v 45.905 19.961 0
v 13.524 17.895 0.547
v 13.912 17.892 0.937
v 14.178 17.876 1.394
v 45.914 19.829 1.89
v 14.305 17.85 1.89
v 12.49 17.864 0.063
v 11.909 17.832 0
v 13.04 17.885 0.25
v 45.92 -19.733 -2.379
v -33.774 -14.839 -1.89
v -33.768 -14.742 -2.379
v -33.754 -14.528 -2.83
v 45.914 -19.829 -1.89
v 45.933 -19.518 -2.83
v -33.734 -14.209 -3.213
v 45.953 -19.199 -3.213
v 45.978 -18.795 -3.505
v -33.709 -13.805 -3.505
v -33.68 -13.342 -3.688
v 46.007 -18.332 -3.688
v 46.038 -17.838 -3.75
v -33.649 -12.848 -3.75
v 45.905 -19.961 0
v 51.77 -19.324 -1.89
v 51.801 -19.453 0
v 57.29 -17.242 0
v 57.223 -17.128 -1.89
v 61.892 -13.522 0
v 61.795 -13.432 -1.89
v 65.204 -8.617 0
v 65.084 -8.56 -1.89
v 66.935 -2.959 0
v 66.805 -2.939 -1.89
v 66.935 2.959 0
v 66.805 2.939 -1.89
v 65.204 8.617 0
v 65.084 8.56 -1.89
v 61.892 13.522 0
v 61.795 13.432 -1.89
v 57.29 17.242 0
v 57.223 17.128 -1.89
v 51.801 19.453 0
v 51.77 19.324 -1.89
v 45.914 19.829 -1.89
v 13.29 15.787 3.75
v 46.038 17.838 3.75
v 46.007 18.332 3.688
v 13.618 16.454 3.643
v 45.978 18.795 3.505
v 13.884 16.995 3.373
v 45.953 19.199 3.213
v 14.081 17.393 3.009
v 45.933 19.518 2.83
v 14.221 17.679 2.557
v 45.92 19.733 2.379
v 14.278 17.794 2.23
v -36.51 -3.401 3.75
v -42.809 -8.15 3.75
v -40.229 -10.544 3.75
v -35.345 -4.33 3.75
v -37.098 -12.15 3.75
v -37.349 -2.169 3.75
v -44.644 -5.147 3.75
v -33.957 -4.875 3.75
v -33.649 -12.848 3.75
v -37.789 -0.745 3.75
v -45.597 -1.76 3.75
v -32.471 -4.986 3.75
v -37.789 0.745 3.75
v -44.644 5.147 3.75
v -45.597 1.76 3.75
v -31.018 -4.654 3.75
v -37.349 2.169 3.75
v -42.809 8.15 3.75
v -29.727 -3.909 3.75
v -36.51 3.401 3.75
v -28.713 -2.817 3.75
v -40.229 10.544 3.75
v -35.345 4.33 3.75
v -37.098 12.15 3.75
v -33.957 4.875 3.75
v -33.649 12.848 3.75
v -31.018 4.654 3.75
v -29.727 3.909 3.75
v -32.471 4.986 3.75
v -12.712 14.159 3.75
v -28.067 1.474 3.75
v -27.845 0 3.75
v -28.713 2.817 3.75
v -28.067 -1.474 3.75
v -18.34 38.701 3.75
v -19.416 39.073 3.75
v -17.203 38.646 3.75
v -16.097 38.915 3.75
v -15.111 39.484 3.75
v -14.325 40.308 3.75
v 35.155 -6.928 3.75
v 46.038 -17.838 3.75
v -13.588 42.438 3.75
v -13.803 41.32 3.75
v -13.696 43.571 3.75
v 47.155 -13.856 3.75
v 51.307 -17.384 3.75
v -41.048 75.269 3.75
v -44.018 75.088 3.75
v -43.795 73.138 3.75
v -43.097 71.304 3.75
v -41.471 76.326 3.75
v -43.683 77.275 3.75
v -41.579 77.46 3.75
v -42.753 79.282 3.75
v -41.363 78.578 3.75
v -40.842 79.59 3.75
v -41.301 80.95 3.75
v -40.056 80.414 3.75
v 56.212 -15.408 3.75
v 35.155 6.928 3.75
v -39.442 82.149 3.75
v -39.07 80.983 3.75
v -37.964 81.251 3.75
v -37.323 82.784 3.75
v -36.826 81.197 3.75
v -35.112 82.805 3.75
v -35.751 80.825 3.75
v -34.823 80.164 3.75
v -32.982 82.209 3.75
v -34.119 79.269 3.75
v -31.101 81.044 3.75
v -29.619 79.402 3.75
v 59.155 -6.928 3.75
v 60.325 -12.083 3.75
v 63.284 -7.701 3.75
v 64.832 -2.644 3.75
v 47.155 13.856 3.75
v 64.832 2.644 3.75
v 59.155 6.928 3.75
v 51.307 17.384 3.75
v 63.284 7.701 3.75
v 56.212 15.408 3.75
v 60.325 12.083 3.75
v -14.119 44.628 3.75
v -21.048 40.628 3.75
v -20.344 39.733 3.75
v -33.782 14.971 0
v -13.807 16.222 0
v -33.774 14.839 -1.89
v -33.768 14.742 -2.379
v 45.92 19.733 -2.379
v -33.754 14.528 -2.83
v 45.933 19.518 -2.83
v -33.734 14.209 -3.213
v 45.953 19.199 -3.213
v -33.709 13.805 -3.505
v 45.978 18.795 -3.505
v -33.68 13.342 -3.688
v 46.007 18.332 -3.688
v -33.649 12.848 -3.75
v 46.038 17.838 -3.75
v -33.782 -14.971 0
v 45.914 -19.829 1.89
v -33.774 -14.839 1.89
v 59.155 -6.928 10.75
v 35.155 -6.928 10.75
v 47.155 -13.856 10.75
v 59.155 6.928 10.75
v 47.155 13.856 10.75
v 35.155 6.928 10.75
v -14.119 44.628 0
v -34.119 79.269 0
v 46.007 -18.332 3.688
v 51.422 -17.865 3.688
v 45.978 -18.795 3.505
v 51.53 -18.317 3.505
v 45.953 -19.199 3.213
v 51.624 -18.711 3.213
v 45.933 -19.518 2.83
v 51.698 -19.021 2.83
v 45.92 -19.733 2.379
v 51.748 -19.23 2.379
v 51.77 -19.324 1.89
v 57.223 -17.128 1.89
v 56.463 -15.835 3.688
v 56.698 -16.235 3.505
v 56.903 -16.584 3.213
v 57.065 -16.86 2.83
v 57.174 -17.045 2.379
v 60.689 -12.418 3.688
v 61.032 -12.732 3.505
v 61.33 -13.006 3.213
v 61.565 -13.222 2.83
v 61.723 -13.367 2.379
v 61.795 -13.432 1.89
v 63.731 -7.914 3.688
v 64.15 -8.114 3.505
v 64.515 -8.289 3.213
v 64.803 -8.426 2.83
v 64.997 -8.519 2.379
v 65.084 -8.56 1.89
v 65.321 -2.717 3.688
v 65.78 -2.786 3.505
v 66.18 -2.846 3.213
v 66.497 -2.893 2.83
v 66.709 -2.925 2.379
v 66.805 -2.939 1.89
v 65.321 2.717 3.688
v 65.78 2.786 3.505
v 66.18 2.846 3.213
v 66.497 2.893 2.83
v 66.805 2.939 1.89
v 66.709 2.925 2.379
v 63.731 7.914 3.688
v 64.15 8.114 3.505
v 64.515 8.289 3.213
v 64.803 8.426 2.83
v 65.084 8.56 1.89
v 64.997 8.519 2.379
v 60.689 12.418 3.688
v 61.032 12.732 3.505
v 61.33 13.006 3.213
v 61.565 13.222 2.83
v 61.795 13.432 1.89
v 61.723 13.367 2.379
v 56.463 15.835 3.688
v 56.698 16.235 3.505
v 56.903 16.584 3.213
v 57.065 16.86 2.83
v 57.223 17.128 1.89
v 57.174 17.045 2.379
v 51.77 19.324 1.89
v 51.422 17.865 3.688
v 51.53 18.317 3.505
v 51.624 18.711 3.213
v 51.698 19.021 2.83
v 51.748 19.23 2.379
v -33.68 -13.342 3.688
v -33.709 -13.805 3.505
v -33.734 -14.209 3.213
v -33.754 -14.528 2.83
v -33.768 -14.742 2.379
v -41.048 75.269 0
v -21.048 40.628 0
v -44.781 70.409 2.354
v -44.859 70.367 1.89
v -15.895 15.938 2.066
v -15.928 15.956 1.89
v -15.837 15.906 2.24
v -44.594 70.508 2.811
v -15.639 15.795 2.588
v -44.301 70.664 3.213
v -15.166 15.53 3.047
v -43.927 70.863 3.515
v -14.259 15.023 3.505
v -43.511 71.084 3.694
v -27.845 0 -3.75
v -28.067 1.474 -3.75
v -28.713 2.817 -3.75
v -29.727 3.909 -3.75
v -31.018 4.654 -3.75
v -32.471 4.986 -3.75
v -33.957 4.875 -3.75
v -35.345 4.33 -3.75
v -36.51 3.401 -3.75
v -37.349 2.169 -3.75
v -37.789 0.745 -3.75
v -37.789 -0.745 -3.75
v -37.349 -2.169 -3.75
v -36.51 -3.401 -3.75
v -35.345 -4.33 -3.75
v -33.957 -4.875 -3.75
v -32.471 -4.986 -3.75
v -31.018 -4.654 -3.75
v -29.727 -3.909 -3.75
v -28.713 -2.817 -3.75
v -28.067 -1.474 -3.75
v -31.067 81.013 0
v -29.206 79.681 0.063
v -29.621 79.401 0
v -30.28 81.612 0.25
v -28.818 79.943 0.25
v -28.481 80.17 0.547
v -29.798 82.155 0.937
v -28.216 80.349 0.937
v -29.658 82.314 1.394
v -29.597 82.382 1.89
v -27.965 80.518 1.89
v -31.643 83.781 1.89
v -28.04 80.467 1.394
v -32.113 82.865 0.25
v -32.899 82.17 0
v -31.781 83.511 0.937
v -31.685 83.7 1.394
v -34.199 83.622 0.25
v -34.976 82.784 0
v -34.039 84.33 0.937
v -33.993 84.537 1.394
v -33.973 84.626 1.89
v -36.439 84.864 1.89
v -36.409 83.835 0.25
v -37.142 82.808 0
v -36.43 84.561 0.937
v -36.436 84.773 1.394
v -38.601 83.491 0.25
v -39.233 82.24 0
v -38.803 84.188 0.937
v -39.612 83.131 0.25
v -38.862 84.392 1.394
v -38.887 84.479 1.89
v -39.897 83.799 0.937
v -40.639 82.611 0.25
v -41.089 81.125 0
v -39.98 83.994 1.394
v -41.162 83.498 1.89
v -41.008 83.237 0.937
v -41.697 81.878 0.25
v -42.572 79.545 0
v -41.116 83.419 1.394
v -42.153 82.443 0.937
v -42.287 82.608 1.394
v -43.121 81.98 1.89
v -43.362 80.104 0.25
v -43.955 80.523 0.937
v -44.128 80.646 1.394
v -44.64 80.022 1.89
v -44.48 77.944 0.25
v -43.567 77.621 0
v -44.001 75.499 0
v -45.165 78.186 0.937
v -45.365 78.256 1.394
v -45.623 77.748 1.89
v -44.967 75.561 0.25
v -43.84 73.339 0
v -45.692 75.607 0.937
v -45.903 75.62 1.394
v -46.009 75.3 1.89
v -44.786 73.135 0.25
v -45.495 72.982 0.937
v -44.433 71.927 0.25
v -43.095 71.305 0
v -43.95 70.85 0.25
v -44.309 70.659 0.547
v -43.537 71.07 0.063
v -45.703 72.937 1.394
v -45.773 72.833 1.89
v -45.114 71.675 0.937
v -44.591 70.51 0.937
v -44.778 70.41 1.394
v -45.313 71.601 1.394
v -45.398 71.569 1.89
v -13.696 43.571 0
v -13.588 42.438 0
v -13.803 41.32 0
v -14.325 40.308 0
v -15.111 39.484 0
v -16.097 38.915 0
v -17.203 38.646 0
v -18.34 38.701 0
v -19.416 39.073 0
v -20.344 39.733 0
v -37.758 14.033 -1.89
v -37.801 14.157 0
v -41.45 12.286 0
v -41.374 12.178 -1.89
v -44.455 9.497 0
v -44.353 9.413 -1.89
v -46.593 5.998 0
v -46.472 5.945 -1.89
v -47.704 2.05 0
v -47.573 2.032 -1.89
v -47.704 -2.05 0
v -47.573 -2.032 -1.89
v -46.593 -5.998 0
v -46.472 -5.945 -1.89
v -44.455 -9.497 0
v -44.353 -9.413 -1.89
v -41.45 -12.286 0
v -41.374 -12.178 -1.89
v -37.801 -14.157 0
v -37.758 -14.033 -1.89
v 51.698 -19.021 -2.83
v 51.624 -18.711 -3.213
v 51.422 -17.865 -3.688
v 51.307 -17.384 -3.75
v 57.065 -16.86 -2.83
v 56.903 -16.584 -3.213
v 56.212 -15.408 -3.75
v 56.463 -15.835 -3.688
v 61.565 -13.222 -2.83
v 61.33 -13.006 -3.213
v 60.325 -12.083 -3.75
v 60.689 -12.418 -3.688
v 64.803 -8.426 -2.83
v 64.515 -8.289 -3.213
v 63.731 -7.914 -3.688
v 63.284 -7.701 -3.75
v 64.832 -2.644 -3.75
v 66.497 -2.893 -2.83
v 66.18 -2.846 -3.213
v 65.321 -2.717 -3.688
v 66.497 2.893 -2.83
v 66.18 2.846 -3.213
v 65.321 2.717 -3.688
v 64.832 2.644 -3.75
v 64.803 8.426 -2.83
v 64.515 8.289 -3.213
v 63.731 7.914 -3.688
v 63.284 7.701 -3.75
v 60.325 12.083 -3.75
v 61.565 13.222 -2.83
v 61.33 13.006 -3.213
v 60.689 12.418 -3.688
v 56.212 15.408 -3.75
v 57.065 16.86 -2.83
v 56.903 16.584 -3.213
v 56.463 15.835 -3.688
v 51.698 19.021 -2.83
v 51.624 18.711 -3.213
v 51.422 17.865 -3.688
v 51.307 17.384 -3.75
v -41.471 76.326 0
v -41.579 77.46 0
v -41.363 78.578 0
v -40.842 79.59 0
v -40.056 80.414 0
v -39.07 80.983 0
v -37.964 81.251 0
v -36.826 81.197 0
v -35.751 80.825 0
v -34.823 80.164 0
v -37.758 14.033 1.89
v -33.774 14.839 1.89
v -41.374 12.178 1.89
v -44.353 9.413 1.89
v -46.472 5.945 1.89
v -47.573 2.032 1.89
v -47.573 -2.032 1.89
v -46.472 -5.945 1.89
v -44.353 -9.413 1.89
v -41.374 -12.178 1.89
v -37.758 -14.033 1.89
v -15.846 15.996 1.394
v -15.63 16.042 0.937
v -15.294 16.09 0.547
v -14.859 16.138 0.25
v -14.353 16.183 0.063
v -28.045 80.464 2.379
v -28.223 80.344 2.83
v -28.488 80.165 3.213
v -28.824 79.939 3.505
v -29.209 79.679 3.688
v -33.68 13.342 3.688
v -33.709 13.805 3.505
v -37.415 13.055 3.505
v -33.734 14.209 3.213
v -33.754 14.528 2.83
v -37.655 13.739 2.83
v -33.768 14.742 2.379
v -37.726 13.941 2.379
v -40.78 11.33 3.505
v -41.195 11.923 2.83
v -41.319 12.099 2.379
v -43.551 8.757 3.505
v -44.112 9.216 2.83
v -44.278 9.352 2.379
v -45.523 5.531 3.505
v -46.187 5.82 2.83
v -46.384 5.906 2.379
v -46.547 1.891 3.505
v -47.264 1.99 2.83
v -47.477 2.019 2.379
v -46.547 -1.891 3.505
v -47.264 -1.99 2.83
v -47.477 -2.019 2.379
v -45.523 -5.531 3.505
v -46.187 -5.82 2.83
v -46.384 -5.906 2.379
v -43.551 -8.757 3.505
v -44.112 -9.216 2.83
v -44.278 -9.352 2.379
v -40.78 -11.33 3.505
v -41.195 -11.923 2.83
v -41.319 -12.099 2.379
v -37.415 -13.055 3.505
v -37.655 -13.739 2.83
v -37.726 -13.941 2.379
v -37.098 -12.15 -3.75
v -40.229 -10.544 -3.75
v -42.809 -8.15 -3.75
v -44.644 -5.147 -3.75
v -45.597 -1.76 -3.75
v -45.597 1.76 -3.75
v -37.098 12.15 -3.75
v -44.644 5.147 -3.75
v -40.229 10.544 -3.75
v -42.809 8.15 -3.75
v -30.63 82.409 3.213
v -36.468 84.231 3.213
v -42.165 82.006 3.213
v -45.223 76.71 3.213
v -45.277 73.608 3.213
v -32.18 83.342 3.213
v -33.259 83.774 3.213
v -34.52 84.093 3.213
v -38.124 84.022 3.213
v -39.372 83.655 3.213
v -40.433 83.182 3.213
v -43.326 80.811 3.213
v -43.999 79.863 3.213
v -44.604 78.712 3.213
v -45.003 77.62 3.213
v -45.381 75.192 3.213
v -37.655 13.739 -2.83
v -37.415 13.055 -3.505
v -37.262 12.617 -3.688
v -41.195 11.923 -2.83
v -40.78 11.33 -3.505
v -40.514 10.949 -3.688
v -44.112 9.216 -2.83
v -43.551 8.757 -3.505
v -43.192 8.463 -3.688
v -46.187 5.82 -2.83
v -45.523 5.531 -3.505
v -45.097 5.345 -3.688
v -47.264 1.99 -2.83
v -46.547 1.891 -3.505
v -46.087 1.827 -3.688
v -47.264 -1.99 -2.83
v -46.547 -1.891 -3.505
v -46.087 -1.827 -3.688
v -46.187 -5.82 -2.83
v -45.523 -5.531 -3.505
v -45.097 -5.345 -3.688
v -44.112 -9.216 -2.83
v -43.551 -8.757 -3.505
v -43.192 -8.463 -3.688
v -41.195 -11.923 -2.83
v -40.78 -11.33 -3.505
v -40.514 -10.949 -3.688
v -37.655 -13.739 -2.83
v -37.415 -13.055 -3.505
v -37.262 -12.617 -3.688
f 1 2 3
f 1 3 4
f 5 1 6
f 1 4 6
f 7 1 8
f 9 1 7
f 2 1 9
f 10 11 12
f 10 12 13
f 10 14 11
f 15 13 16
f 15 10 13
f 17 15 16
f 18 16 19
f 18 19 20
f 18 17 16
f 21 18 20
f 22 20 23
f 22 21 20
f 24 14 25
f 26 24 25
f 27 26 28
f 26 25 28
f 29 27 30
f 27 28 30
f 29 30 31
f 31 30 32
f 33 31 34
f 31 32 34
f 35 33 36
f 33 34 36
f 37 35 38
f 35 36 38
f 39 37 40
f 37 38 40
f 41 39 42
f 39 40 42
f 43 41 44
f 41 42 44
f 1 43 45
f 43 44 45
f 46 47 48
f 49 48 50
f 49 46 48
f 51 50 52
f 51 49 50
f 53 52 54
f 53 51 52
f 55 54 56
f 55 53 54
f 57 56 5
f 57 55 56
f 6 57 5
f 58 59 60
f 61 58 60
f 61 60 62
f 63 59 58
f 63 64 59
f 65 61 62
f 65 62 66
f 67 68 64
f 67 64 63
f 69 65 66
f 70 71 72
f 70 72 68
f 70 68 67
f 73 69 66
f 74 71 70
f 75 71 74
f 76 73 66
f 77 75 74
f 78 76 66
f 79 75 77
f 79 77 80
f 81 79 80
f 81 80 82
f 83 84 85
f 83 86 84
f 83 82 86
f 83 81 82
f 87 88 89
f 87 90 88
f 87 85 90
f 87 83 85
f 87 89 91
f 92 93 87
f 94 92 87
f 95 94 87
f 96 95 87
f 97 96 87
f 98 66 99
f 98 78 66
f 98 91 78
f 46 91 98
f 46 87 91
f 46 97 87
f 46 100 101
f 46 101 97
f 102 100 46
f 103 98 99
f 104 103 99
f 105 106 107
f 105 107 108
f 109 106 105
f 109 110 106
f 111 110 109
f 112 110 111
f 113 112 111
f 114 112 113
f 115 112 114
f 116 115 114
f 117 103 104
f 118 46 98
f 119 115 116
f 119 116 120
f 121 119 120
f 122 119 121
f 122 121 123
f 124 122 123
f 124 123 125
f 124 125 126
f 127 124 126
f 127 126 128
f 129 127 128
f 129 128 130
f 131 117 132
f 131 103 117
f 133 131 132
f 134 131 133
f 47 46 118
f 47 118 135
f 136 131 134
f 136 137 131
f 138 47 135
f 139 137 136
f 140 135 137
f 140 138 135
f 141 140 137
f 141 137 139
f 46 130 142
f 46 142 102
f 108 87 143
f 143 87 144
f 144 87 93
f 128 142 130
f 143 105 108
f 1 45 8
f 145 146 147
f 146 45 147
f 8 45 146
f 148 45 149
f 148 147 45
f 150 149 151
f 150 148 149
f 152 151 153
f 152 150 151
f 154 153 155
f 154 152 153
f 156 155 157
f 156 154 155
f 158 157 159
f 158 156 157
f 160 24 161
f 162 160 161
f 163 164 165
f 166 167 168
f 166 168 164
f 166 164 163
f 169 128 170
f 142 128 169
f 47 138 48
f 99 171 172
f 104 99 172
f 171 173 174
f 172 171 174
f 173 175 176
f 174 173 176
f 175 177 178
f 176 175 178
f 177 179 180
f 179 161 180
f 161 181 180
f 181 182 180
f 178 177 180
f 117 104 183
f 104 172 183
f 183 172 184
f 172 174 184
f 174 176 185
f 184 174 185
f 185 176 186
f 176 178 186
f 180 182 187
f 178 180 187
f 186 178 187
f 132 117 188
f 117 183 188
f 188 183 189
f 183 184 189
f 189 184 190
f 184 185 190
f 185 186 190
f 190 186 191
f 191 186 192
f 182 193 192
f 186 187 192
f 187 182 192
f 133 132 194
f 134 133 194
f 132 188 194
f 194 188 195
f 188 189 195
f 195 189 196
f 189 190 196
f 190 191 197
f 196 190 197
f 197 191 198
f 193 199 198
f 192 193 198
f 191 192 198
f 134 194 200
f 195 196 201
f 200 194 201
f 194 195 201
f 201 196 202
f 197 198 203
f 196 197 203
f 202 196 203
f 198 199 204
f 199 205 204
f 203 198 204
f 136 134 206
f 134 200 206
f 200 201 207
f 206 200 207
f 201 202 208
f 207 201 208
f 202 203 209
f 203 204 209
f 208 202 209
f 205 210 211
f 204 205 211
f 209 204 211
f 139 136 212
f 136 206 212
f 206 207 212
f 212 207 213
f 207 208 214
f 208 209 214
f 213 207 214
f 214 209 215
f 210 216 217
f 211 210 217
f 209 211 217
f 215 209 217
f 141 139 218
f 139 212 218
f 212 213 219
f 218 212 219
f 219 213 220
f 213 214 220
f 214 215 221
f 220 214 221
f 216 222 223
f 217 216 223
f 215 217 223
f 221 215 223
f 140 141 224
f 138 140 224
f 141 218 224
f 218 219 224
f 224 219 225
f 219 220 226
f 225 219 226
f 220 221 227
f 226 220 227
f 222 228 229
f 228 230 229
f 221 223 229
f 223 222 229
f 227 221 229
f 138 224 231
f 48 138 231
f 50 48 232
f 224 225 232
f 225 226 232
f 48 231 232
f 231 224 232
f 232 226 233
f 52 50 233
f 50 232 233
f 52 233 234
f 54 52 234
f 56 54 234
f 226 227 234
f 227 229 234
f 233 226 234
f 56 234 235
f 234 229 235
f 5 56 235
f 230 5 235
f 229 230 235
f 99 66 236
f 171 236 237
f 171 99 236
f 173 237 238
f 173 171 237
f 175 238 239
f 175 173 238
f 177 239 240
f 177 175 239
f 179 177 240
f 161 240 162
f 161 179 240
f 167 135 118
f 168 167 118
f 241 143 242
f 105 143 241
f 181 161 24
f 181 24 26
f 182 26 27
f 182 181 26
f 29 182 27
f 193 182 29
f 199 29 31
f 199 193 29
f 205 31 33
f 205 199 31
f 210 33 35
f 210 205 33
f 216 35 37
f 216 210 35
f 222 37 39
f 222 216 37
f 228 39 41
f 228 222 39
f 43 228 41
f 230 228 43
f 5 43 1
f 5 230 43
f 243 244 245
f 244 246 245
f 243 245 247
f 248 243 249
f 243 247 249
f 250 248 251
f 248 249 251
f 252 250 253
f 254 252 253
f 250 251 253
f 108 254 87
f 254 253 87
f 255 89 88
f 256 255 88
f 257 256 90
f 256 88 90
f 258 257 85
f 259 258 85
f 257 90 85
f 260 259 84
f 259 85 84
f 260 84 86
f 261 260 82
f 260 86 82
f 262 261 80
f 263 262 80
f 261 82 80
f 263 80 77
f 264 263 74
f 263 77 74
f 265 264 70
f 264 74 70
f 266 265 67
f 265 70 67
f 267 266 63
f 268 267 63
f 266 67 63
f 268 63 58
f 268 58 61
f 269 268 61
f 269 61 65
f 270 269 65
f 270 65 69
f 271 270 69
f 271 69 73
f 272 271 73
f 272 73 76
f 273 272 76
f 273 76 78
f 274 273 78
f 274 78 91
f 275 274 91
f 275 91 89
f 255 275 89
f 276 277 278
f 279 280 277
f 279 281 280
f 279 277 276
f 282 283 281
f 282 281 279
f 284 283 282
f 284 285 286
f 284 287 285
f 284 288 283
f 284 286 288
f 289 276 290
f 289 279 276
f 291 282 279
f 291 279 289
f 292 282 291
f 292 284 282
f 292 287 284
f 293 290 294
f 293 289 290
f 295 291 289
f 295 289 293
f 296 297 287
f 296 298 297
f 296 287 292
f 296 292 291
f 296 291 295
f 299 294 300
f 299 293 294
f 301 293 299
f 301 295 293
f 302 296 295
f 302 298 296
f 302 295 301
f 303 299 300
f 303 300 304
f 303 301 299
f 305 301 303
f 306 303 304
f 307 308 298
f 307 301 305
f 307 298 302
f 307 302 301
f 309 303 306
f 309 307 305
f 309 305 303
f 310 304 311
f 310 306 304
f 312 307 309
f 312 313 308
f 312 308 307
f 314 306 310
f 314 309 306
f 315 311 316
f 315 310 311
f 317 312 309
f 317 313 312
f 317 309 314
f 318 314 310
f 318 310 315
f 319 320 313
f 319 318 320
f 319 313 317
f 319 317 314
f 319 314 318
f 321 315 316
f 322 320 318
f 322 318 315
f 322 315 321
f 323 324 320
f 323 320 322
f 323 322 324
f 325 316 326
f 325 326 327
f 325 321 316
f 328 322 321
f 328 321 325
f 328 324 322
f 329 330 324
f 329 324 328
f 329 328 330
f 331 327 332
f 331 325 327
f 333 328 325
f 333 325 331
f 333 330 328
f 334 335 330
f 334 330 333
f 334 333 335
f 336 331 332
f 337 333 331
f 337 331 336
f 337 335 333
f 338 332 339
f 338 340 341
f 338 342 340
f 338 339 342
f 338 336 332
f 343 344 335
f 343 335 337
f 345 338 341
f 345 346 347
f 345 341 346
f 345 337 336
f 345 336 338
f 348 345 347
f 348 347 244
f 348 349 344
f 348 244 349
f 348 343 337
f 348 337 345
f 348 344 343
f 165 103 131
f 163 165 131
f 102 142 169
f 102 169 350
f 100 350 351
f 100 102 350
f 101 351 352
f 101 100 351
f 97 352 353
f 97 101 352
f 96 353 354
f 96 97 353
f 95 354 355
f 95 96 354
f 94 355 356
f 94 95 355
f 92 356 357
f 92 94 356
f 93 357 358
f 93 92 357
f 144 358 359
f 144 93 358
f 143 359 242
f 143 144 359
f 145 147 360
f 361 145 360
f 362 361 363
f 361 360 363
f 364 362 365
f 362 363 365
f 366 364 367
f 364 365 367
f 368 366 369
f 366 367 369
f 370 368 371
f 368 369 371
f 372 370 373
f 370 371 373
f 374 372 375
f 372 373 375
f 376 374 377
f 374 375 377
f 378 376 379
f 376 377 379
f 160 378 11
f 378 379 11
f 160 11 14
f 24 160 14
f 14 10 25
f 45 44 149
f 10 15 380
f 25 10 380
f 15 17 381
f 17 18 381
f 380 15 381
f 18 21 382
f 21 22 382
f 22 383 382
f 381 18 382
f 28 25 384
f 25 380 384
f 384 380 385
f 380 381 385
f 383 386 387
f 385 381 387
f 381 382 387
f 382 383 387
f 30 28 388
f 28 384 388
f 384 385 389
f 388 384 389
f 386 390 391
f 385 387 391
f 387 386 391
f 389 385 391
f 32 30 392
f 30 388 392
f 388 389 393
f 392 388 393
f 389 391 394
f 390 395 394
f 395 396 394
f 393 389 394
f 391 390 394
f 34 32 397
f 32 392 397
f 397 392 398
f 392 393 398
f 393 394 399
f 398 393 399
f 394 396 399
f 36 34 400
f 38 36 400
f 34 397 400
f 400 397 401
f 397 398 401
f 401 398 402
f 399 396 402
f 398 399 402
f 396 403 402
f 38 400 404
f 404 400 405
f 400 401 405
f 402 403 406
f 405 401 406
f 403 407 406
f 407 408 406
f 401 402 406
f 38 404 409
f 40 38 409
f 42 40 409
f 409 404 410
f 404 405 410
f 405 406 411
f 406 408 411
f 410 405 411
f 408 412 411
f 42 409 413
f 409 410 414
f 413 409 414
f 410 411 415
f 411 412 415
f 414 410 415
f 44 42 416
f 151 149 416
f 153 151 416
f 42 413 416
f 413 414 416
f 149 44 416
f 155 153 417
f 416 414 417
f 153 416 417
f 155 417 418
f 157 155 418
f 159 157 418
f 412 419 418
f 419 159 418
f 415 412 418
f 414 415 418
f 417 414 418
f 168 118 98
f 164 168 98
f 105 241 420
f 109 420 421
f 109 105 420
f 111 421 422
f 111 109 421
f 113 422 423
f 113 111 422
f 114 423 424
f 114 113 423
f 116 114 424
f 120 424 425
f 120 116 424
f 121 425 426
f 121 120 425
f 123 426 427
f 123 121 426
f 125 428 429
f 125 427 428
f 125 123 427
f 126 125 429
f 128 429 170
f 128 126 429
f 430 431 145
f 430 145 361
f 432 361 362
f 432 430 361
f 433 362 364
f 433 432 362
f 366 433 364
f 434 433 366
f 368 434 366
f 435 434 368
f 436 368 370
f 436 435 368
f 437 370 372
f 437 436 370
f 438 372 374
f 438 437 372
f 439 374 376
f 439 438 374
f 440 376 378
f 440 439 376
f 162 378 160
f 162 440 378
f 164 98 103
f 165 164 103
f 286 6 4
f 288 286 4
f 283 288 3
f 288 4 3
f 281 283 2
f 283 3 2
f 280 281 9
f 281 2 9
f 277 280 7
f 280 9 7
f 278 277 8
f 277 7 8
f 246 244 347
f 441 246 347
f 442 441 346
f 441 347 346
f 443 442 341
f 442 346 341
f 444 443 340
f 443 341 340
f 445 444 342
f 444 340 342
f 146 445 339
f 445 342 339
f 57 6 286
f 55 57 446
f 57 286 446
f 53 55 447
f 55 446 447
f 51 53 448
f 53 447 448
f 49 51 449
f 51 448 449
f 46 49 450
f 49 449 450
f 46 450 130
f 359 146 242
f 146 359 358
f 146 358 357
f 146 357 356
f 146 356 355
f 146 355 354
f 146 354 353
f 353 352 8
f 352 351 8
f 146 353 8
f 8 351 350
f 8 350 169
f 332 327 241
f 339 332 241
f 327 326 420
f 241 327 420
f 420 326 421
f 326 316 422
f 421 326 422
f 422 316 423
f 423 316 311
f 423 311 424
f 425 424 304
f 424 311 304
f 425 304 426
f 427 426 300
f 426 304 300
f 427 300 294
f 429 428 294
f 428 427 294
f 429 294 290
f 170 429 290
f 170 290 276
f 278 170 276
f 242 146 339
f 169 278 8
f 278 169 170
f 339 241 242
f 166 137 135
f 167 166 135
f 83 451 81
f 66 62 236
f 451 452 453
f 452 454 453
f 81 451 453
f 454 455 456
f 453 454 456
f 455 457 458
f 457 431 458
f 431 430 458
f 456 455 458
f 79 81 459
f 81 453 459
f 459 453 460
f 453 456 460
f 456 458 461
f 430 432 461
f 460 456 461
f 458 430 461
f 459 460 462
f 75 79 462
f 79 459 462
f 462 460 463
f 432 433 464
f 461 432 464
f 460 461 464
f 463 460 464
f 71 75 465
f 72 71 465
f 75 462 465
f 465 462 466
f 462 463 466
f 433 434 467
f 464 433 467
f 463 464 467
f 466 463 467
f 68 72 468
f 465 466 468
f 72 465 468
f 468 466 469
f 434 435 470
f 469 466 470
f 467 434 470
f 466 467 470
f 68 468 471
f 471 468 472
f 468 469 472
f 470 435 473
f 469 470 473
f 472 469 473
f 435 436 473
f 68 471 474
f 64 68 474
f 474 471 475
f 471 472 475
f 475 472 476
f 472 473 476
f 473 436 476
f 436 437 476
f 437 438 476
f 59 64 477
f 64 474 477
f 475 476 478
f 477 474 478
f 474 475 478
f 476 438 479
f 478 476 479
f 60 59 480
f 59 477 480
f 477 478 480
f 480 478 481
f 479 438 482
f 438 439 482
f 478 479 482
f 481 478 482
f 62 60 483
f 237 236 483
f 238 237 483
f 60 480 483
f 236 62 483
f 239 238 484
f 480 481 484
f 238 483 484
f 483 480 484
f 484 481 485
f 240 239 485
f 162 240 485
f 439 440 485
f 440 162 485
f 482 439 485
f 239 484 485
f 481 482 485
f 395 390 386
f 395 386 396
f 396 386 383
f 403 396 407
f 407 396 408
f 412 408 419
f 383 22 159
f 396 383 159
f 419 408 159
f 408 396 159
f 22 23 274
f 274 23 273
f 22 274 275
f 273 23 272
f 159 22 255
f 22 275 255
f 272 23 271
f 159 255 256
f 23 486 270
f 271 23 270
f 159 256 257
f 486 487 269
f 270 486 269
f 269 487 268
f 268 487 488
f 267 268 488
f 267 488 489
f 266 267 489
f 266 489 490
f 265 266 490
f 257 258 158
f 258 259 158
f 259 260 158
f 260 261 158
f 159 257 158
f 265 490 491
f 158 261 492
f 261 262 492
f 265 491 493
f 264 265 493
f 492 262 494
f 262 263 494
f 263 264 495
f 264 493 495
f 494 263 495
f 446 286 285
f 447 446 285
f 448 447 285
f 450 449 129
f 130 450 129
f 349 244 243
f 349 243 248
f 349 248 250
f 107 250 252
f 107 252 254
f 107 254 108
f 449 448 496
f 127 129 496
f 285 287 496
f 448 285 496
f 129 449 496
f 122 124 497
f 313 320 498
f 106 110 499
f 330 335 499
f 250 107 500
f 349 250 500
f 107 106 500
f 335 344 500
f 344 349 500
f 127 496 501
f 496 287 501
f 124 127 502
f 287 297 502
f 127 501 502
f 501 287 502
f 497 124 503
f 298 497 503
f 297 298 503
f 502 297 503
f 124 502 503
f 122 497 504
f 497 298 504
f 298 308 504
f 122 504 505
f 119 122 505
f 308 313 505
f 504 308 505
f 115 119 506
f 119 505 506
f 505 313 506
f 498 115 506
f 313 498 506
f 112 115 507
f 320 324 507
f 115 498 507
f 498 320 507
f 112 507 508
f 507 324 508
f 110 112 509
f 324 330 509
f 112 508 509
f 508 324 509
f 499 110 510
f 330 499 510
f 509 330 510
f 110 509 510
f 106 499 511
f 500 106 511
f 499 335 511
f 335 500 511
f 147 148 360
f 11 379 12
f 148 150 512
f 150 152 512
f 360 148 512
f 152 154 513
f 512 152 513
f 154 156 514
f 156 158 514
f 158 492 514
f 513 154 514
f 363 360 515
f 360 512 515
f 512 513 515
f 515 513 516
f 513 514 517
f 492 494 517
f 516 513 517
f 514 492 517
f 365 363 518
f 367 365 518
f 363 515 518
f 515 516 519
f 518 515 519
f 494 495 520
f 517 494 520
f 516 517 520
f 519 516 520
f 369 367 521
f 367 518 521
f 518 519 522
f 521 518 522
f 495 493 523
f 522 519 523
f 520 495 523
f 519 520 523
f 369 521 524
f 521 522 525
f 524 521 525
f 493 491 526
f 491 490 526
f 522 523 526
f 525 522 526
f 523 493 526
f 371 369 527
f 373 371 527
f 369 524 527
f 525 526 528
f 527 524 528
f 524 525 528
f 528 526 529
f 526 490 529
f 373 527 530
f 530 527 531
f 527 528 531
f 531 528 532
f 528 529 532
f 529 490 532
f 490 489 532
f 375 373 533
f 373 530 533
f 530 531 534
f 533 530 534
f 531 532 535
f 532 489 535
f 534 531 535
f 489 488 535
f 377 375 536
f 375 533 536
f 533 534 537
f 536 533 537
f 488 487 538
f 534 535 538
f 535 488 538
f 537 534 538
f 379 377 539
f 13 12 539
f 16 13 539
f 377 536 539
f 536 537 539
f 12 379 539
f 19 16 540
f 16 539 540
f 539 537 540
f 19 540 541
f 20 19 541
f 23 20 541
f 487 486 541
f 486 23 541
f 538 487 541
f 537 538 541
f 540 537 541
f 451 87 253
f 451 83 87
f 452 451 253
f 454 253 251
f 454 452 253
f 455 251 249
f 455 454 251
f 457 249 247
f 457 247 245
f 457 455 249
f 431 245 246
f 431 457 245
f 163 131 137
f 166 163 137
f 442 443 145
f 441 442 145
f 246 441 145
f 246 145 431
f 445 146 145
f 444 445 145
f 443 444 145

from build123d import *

# Parameters (mm, degrees)
EXTRUDE_313_DEPTH           = 3.75
EXTRUDE_313_TAPER           = 4.000000000000009
EXTRUDE_313_OTHER_WAY_DEPTH = 3.75
EXTRUDE_313_OTHER_WAY_TAPER = 4.000000000000009
EXTRUDE_604_DEPTH           = 3.75
EXTRUDE_604_TAPER           = 4.000000000000009
CUT_EXTRUDE_1_DEPTH         = 109.586836915909
SKETCH_4_R                  = 5.000000000000001
CUT_EXTRUDE_2_DEPTH         = 109.586836915909
EXTRUDE_4_DEPTH             = 7
FILLET_1_R                  = 2
FILLET_2_R                  = 2


with BuildPart() as part:
    # Эскиз1 → Extrude 313 (new body)
    with BuildSketch(Plane.XY):
        with BuildLine():
            ThreePointArc((-33.78207478005865, 14.970674458754354), (-47.84457478005865, 1.84e-15), (-33.78207478005865, -14.970674458754353))
            Line((-33.78207478005865, -14.970674458754353), (45.90542521994135, -19.960899278339138))
            ThreePointArc((45.90542521994135, -19.960899278339138), (67.15542521994135, 0), (45.90542521994135, 19.96089927833915))
            Line((45.90542521994135, 19.96089927833915), (-33.78207478005865, 14.970674458754354))
        make_face()
    extrude(amount=EXTRUDE_313_DEPTH, taper=EXTRUDE_313_TAPER)

    # Эскиз1 → Extrude 313 other way (add)
    with BuildSketch(Plane.XY):
        with BuildLine():
            ThreePointArc((-33.78207478005865, 14.970674458754354), (-47.84457478005865, 1.84e-15), (-33.78207478005865, -14.970674458754353))
            Line((-33.78207478005865, -14.970674458754353), (45.90542521994135, -19.960899278339138))
            ThreePointArc((45.90542521994135, -19.960899278339138), (67.15542521994135, 0), (45.90542521994135, 19.96089927833915))
            Line((45.90542521994135, 19.96089927833915), (-33.78207478005865, 14.970674458754354))
        make_face()
    extrude(amount=-EXTRUDE_313_OTHER_WAY_DEPTH, taper=EXTRUDE_313_OTHER_WAY_TAPER)

    # Эскиз2 → Extrude 604 (add, through all)
    with BuildSketch(Plane.XY):
        with BuildLine():
            Line((-44.97532089787029, 70.30528437214097), (-7.5933381015594845, 6.94e-15))
            Line((-7.5933381015594845, 6.94e-15), (26.39163556671457, 0.16728878792131394))
            Line((26.39163556671457, 0.16728878792131394), (-27.855469243730653, 80.59192903470745))
            ThreePointArc((-27.855469243730653, 80.59192903470745), (-41.29622571838166, 83.57167300702109), (-44.97532089787029, 70.30528437214097))
        make_face()
    extrude(amount=EXTRUDE_604_DEPTH, taper=EXTRUDE_604_TAPER)

    # Эскиз3 → Вырез-Вытянуть1 (cut, through all)
    with BuildSketch(Plane.XY.offset(3.75)):
        with BuildLine():
            Line((-34.119324442658446, 79.26930388139459), (-14.119324442658357, 44.62828773001714))
            ThreePointArc((-14.119324442658357, 44.62828773001714), (-15.58342605779593, 39.16418611487918), (-21.04752767293403, 40.62828773001693))
            Line((-21.04752767293403, 40.62828773001693), (-41.04752767293395, 75.26930388139452))
            ThreePointArc((-41.04752767293395, 75.26930388139452), (-39.583426057796224, 80.73340549653236), (-34.119324442658446, 79.26930388139459))
        make_face()
    extrude(amount=-CUT_EXTRUDE_1_DEPTH, mode=Mode.SUBTRACT)

    # Эскиз4 → Вырез-Вытянуть2 (cut, through all)
    with BuildSketch(Plane.XY.offset(3.75)):
        with Locations((-32.84457478005865, 0)):
            Circle(SKETCH_4_R)
    extrude(amount=-CUT_EXTRUDE_2_DEPTH, mode=Mode.SUBTRACT)

    # Эскиз6 → Бобышка-Вытянуть4 (add)
    with BuildSketch(Plane.XY.offset(3.75)):
        Polygon((47.15542521994136, 13.85640646055103), (35.15542521994135, 6.928203230275517), (35.15542521994135, -6.928203230275513), (47.15542521994134, -13.856406460551026), (59.15542521994136, -6.928203230275509), (59.15542521994136, 6.9282032302755185), align=None)
    extrude(amount=EXTRUDE_4_DEPTH)

    # Скругление1
    fillet_1_edges = [part.edges().sort_by_distance(p)[0] for p in [
        (-47.582349235270485, -7.8e-16, -3.75),
        (66.8931996751532, 7.99e-15, 3.7499999999999996),
        (30.080486304539015, 18.707163953539766, 3.75),
        (-47.582349235270485, 2.33e-15, 3.7499999999999996),
        (6.078064316490606, -17.204073984160548, 3.7500000000000004),
        (6.078064316490607, -17.204073984160537, -3.75),
        (-24.741927783764027, 15.274051213737346, 3.7499999999999996),
        (-6.916852890128096, 49.0802179420399, 3.7500000000000058),
        (-41.16116957860173, 83.34690184461988, 3.7499999999999996),
        (-30.23097968416606, 43.13376633078081, 3.750000000000007),
        (66.89319967515318, -5.55e-15, -3.75),
        (6.078064316490607, 17.20407398416054, -3.75),
    ]]
    fillet(fillet_1_edges, radius=FILLET_1_R)

    # Скругление2
    # the kernel refuses this fillet: 2 mm, written as the material it takes off along each edge
    with BuildSketch(Plane(origin=(-44.97532089787029, 70.30528437214097, 0), x_dir=(0.06159131057865614, 0.03274868074306383, 0.9975640502598279), z_dir=(0.46947156278590146, -0.8829475928589213, 0))) as fillet_2_piece_1_section:
        with BuildLine():
            CenterArc((2.1436447558512195, -1.98437417397325), FILLET_2_R, 97.16683307666736, 86.83316692332966)
            Line((0.1485166553315637, -2.123887121461397), (0.10861409332117057, -2.12667738041116))
            Line((0.10861409332117057, -2.12667738041116), (-0.03990256201039311, -0.00279025894976294))
            Line((-0.03990256201039311, -0.00279025894976294), (1.96e-15, 0.04000000000000188))
            ThreePointArc((1.96e-15, 0.04000000000000188), (0.9470634727645385, 0.04000000000004966), (1.8891365893226297, 0.03968748347946698))
            Line((1.8891365893226297, 0.03968748347946698), (1.894126945529073, 0))
        make_face()
    fillet_2_piece_1 = extrude(amount=66.74180982875873, mode=Mode.PRIVATE)
    fillet_2_piece_1 = split(fillet_2_piece_1, bisect_by=Plane(origin=(-41.49695385970438, 14.76021709060138, 3.8916978839733556), z_dir=(-0.06234775314123914, 0.9956137765464197, -0.06975647374412589)), keep=Keep.TOP, mode=Mode.PRIVATE)
    with BuildSketch(Plane(origin=(-44.97532089787029, 70.30528437214097, 0), x_dir=(0.06159131057865614, 0.03274868074306383, 0.9975640502598279), z_dir=(0.46947156278590146, -0.8829475928589213, 0))) as fillet_2_piece_2_section:
        with BuildLine():
            CenterArc((2.1436447558512195, -1.98437417397325), FILLET_2_R, 97.16683307666736, 86.83316692332966)
            Line((0.1485166553315637, -2.123887121461397), (0.10861409332117057, -2.12667738041116))
            Line((0.10861409332117057, -2.12667738041116), (-0.03990256201039311, -0.00279025894976294))
            Line((-0.03990256201039311, -0.00279025894976294), (1.96e-15, 0.04000000000000188))
            ThreePointArc((1.96e-15, 0.04000000000000188), (0.9470634727645385, 0.04000000000004966), (1.8891365893226297, 0.03968748347946698))
            Line((1.8891365893226297, 0.03968748347946698), (1.894126945529073, 0))
        make_face()
    fillet_2_piece_2 = extrude(amount=66.74180982875873, mode=Mode.PRIVATE)
    fillet_2_piece_2 = split(fillet_2_piece_2, bisect_by=Plane(origin=(-41.49695385970437, 14.760217090601344, -3.891697883973335), z_dir=(-0.062347753141239255, 0.9956137765464199, 0.0697564737441255)), keep=Keep.TOP, mode=Mode.PRIVATE)
    fillet_2_piece_2 = split(fillet_2_piece_2, bisect_by=Plane(origin=(-41.49695385970438, 14.76021709060138, 3.8916978839733556), z_dir=(0.06234775314123914, -0.9956137765464197, 0.06975647374412589)), keep=Keep.TOP, mode=Mode.PRIVATE)
    with BuildSketch(Plane(origin=(-44.97532089787029, 70.30528437214097, 0), x_dir=(0.06159131057865614, 0.03274868074306383, 0.9975640502598279), z_dir=(0.46947156278590146, -0.8829475928589213, 0))) as fillet_2_piece_3_section:
        with BuildLine():
            CenterArc((2.1436447558512195, -1.98437417397325), FILLET_2_R, 97.16683307666736, 86.83316692332966)
            Line((0.1485166553315637, -2.123887121461397), (0.10861409332117057, -2.12667738041116))
            Line((0.10861409332117057, -2.12667738041116), (-0.03990256201039311, -0.00279025894976294))
            Line((-0.03990256201039311, -0.00279025894976294), (1.96e-15, 0.04000000000000188))
            ThreePointArc((1.96e-15, 0.04000000000000188), (0.9470634727645385, 0.04000000000004966), (1.8891365893226297, 0.03968748347946698))
            Line((1.8891365893226297, 0.03968748347946698), (1.894126945529073, 0))
        make_face()
    fillet_2_piece_3 = extrude(amount=66.74180982875873, mode=Mode.PRIVATE)
    fillet_2_piece_3 = split(fillet_2_piece_3, bisect_by=Plane(origin=(-41.49695385970437, 14.760217090601344, -3.891697883973335), z_dir=(0.062347753141239255, -0.9956137765464199, -0.0697564737441255)), keep=Keep.TOP, mode=Mode.PRIVATE)
    fillet_2_piece_3 = split(fillet_2_piece_3, bisect_by=Plane(origin=(-41.49695385970438, 14.760217090601387, 3.8916978839733547), z_dir=(-0.06234775314123914, 0.9956137765464197, -0.06975647374412589)), keep=Keep.TOP, mode=Mode.PRIVATE)
    with BuildSketch(Plane(origin=(-36.14584496928108, 74.99999999999999, 0), x_dir=(0.8290375725550423, 0.559192903470746, 0), z_dir=(0.559192903470746, -0.8290375725550423, 0))) as fillet_2_piece_4:
        with BuildLine():
            CenterArc((7.870930249758116, 2), FILLET_2_R, 270, 86.83316692332944)
            Line((9.867876070562296, 1.8895129474882502), (9.907814986978373, 1.887303206438015))
            ThreePointArc((9.907814986978373, 1.887303206438015), (9.973838762709134, 0.9475466044073921), (10.039902562010383, 0.00279025894976502))
            Line((10.039902562010383, 0.00279025894976502), (9.999999999999998, -0.04))
            Line((9.999999999999998, -0.04), (7.870930249758116, -0.04))
            Line((7.870930249758116, -0.04), (7.870930249758116, 0))
        make_face()
    fillet_2_piece_4_solid = revolve(axis=Axis((-36.14584496928108, 74.99999999999999, 0), (0, 0, 1)), revolution_arc=174.00000000000074, mode=Mode.PRIVATE)
    with BuildSketch(Plane(origin=(17.34900989046163, 13.5735326684051, 0), x_dir=(-0.057830737662793216, -0.03900732508883394, 0.9975640502598272), z_dir=(-0.5591929034707452, 0.8290375725550428, 0))) as fillet_2_piece_5_section:
        with BuildLine():
            CenterArc((2.1436447558512377, -1.9843741739732534), FILLET_2_R, 97.16683307666793, 86.8331669233296)
            Line((0.14851665533158329, -2.1238871214614172), (0.1086140933211902, -2.1266773804111807))
            Line((0.1086140933211902, -2.1266773804111807), (-0.03990256201039322, -0.00279025894976136))
            Line((-0.03990256201039322, -0.00279025894976136), (1.63e-15, 0.04000000000000167))
            ThreePointArc((1.63e-15, 0.04000000000000167), (0.9470634727645375, 0.04000000000004274), (1.8891365893226273, 0.03968748347946384))
            Line((1.8891365893226273, 0.03968748347946384), (1.8941269455290706, 2e-17))
        make_face()
    fillet_2_piece_5 = extrude(amount=80.8387925769827, mode=Mode.PRIVATE)
    fillet_2_piece_5 = split(fillet_2_piece_5, bisect_by=Plane(origin=(17.06352440073483, 18.13237035309626, 0.31940944244362984), z_dir=(-0.062347753141239255, 0.9956137765464199, 0.0697564737441255)), keep=Keep.TOP, mode=Mode.PRIVATE)
    fillet_2_piece_5 = split(fillet_2_piece_5, bisect_by=Plane(origin=(17.06352440073483, 18.132370353096263, -0.31940944244363195), z_dir=(0.06234775314123914, -0.9956137765464197, 0.06975647374412589)), keep=Keep.TOP, mode=Mode.PRIVATE)
    with BuildSketch(Plane(origin=(17.34900989046163, 13.5735326684051, 0), x_dir=(-0.057830737662793216, -0.03900732508883394, 0.9975640502598272), z_dir=(-0.5591929034707452, 0.8290375725550428, 0))) as fillet_2_piece_6_section:
        with BuildLine():
            CenterArc((2.1436447558512377, -1.9843741739732534), FILLET_2_R, 97.16683307666793, 86.8331669233296)
            Line((0.14851665533158329, -2.1238871214614172), (0.1086140933211902, -2.1266773804111807))
            Line((0.1086140933211902, -2.1266773804111807), (-0.03990256201039322, -0.00279025894976136))
            Line((-0.03990256201039322, -0.00279025894976136), (1.63e-15, 0.04000000000000167))
            ThreePointArc((1.63e-15, 0.04000000000000167), (0.9470634727645375, 0.04000000000004274), (1.8891365893226273, 0.03968748347946384))
            Line((1.8891365893226273, 0.03968748347946384), (1.8941269455290706, 2e-17))
        make_face()
    fillet_2_piece_6 = extrude(amount=80.8387925769827, mode=Mode.PRIVATE)
    fillet_2_piece_6 = split(fillet_2_piece_6, bisect_by=Plane(origin=(17.06352440073483, 18.132370353096263, 0.31940944244363006), z_dir=(0.062347753141239255, -0.9956137765464199, -0.0697564737441255)), keep=Keep.TOP, mode=Mode.PRIVATE)
    fillet_2_piece_6 = split(fillet_2_piece_6, bisect_by=Plane(origin=(17.06352440073483, 18.132370353096263, -0.31940944244363195), z_dir=(-0.06234775314123914, 0.9956137765464197, -0.06975647374412589)), keep=Keep.TOP, mode=Mode.PRIVATE)
    with BuildSketch(Plane(origin=(17.34900989046163, 13.5735326684051, 0), x_dir=(-0.057830737662793216, -0.03900732508883394, 0.9975640502598272), z_dir=(-0.5591929034707452, 0.8290375725550428, 0))) as fillet_2_piece_7_section:
        with BuildLine():
            CenterArc((2.1436447558512377, -1.9843741739732534), FILLET_2_R, 97.16683307666793, 86.8331669233296)
            Line((0.14851665533158329, -2.1238871214614172), (0.1086140933211902, -2.1266773804111807))
            Line((0.1086140933211902, -2.1266773804111807), (-0.03990256201039322, -0.00279025894976136))
            Line((-0.03990256201039322, -0.00279025894976136), (1.63e-15, 0.04000000000000167))
            ThreePointArc((1.63e-15, 0.04000000000000167), (0.9470634727645375, 0.04000000000004274), (1.8891365893226273, 0.03968748347946384))
            Line((1.8891365893226273, 0.03968748347946384), (1.8941269455290706, 2e-17))
        make_face()
    fillet_2_piece_7 = extrude(amount=80.8387925769827, mode=Mode.PRIVATE)
    fillet_2_piece_7 = split(fillet_2_piece_7, bisect_by=Plane(origin=(17.06352440073483, 18.132370353096263, -0.31940944244363195), z_dir=(-0.06234775314123914, 0.9956137765464197, -0.06975647374412589)), keep=Keep.TOP, mode=Mode.PRIVATE)
    add([fillet_2_piece_1, fillet_2_piece_2, fillet_2_piece_3, fillet_2_piece_4_solid, fillet_2_piece_5, fillet_2_piece_6, fillet_2_piece_7], mode=Mode.SUBTRACT)


solid = part.part
